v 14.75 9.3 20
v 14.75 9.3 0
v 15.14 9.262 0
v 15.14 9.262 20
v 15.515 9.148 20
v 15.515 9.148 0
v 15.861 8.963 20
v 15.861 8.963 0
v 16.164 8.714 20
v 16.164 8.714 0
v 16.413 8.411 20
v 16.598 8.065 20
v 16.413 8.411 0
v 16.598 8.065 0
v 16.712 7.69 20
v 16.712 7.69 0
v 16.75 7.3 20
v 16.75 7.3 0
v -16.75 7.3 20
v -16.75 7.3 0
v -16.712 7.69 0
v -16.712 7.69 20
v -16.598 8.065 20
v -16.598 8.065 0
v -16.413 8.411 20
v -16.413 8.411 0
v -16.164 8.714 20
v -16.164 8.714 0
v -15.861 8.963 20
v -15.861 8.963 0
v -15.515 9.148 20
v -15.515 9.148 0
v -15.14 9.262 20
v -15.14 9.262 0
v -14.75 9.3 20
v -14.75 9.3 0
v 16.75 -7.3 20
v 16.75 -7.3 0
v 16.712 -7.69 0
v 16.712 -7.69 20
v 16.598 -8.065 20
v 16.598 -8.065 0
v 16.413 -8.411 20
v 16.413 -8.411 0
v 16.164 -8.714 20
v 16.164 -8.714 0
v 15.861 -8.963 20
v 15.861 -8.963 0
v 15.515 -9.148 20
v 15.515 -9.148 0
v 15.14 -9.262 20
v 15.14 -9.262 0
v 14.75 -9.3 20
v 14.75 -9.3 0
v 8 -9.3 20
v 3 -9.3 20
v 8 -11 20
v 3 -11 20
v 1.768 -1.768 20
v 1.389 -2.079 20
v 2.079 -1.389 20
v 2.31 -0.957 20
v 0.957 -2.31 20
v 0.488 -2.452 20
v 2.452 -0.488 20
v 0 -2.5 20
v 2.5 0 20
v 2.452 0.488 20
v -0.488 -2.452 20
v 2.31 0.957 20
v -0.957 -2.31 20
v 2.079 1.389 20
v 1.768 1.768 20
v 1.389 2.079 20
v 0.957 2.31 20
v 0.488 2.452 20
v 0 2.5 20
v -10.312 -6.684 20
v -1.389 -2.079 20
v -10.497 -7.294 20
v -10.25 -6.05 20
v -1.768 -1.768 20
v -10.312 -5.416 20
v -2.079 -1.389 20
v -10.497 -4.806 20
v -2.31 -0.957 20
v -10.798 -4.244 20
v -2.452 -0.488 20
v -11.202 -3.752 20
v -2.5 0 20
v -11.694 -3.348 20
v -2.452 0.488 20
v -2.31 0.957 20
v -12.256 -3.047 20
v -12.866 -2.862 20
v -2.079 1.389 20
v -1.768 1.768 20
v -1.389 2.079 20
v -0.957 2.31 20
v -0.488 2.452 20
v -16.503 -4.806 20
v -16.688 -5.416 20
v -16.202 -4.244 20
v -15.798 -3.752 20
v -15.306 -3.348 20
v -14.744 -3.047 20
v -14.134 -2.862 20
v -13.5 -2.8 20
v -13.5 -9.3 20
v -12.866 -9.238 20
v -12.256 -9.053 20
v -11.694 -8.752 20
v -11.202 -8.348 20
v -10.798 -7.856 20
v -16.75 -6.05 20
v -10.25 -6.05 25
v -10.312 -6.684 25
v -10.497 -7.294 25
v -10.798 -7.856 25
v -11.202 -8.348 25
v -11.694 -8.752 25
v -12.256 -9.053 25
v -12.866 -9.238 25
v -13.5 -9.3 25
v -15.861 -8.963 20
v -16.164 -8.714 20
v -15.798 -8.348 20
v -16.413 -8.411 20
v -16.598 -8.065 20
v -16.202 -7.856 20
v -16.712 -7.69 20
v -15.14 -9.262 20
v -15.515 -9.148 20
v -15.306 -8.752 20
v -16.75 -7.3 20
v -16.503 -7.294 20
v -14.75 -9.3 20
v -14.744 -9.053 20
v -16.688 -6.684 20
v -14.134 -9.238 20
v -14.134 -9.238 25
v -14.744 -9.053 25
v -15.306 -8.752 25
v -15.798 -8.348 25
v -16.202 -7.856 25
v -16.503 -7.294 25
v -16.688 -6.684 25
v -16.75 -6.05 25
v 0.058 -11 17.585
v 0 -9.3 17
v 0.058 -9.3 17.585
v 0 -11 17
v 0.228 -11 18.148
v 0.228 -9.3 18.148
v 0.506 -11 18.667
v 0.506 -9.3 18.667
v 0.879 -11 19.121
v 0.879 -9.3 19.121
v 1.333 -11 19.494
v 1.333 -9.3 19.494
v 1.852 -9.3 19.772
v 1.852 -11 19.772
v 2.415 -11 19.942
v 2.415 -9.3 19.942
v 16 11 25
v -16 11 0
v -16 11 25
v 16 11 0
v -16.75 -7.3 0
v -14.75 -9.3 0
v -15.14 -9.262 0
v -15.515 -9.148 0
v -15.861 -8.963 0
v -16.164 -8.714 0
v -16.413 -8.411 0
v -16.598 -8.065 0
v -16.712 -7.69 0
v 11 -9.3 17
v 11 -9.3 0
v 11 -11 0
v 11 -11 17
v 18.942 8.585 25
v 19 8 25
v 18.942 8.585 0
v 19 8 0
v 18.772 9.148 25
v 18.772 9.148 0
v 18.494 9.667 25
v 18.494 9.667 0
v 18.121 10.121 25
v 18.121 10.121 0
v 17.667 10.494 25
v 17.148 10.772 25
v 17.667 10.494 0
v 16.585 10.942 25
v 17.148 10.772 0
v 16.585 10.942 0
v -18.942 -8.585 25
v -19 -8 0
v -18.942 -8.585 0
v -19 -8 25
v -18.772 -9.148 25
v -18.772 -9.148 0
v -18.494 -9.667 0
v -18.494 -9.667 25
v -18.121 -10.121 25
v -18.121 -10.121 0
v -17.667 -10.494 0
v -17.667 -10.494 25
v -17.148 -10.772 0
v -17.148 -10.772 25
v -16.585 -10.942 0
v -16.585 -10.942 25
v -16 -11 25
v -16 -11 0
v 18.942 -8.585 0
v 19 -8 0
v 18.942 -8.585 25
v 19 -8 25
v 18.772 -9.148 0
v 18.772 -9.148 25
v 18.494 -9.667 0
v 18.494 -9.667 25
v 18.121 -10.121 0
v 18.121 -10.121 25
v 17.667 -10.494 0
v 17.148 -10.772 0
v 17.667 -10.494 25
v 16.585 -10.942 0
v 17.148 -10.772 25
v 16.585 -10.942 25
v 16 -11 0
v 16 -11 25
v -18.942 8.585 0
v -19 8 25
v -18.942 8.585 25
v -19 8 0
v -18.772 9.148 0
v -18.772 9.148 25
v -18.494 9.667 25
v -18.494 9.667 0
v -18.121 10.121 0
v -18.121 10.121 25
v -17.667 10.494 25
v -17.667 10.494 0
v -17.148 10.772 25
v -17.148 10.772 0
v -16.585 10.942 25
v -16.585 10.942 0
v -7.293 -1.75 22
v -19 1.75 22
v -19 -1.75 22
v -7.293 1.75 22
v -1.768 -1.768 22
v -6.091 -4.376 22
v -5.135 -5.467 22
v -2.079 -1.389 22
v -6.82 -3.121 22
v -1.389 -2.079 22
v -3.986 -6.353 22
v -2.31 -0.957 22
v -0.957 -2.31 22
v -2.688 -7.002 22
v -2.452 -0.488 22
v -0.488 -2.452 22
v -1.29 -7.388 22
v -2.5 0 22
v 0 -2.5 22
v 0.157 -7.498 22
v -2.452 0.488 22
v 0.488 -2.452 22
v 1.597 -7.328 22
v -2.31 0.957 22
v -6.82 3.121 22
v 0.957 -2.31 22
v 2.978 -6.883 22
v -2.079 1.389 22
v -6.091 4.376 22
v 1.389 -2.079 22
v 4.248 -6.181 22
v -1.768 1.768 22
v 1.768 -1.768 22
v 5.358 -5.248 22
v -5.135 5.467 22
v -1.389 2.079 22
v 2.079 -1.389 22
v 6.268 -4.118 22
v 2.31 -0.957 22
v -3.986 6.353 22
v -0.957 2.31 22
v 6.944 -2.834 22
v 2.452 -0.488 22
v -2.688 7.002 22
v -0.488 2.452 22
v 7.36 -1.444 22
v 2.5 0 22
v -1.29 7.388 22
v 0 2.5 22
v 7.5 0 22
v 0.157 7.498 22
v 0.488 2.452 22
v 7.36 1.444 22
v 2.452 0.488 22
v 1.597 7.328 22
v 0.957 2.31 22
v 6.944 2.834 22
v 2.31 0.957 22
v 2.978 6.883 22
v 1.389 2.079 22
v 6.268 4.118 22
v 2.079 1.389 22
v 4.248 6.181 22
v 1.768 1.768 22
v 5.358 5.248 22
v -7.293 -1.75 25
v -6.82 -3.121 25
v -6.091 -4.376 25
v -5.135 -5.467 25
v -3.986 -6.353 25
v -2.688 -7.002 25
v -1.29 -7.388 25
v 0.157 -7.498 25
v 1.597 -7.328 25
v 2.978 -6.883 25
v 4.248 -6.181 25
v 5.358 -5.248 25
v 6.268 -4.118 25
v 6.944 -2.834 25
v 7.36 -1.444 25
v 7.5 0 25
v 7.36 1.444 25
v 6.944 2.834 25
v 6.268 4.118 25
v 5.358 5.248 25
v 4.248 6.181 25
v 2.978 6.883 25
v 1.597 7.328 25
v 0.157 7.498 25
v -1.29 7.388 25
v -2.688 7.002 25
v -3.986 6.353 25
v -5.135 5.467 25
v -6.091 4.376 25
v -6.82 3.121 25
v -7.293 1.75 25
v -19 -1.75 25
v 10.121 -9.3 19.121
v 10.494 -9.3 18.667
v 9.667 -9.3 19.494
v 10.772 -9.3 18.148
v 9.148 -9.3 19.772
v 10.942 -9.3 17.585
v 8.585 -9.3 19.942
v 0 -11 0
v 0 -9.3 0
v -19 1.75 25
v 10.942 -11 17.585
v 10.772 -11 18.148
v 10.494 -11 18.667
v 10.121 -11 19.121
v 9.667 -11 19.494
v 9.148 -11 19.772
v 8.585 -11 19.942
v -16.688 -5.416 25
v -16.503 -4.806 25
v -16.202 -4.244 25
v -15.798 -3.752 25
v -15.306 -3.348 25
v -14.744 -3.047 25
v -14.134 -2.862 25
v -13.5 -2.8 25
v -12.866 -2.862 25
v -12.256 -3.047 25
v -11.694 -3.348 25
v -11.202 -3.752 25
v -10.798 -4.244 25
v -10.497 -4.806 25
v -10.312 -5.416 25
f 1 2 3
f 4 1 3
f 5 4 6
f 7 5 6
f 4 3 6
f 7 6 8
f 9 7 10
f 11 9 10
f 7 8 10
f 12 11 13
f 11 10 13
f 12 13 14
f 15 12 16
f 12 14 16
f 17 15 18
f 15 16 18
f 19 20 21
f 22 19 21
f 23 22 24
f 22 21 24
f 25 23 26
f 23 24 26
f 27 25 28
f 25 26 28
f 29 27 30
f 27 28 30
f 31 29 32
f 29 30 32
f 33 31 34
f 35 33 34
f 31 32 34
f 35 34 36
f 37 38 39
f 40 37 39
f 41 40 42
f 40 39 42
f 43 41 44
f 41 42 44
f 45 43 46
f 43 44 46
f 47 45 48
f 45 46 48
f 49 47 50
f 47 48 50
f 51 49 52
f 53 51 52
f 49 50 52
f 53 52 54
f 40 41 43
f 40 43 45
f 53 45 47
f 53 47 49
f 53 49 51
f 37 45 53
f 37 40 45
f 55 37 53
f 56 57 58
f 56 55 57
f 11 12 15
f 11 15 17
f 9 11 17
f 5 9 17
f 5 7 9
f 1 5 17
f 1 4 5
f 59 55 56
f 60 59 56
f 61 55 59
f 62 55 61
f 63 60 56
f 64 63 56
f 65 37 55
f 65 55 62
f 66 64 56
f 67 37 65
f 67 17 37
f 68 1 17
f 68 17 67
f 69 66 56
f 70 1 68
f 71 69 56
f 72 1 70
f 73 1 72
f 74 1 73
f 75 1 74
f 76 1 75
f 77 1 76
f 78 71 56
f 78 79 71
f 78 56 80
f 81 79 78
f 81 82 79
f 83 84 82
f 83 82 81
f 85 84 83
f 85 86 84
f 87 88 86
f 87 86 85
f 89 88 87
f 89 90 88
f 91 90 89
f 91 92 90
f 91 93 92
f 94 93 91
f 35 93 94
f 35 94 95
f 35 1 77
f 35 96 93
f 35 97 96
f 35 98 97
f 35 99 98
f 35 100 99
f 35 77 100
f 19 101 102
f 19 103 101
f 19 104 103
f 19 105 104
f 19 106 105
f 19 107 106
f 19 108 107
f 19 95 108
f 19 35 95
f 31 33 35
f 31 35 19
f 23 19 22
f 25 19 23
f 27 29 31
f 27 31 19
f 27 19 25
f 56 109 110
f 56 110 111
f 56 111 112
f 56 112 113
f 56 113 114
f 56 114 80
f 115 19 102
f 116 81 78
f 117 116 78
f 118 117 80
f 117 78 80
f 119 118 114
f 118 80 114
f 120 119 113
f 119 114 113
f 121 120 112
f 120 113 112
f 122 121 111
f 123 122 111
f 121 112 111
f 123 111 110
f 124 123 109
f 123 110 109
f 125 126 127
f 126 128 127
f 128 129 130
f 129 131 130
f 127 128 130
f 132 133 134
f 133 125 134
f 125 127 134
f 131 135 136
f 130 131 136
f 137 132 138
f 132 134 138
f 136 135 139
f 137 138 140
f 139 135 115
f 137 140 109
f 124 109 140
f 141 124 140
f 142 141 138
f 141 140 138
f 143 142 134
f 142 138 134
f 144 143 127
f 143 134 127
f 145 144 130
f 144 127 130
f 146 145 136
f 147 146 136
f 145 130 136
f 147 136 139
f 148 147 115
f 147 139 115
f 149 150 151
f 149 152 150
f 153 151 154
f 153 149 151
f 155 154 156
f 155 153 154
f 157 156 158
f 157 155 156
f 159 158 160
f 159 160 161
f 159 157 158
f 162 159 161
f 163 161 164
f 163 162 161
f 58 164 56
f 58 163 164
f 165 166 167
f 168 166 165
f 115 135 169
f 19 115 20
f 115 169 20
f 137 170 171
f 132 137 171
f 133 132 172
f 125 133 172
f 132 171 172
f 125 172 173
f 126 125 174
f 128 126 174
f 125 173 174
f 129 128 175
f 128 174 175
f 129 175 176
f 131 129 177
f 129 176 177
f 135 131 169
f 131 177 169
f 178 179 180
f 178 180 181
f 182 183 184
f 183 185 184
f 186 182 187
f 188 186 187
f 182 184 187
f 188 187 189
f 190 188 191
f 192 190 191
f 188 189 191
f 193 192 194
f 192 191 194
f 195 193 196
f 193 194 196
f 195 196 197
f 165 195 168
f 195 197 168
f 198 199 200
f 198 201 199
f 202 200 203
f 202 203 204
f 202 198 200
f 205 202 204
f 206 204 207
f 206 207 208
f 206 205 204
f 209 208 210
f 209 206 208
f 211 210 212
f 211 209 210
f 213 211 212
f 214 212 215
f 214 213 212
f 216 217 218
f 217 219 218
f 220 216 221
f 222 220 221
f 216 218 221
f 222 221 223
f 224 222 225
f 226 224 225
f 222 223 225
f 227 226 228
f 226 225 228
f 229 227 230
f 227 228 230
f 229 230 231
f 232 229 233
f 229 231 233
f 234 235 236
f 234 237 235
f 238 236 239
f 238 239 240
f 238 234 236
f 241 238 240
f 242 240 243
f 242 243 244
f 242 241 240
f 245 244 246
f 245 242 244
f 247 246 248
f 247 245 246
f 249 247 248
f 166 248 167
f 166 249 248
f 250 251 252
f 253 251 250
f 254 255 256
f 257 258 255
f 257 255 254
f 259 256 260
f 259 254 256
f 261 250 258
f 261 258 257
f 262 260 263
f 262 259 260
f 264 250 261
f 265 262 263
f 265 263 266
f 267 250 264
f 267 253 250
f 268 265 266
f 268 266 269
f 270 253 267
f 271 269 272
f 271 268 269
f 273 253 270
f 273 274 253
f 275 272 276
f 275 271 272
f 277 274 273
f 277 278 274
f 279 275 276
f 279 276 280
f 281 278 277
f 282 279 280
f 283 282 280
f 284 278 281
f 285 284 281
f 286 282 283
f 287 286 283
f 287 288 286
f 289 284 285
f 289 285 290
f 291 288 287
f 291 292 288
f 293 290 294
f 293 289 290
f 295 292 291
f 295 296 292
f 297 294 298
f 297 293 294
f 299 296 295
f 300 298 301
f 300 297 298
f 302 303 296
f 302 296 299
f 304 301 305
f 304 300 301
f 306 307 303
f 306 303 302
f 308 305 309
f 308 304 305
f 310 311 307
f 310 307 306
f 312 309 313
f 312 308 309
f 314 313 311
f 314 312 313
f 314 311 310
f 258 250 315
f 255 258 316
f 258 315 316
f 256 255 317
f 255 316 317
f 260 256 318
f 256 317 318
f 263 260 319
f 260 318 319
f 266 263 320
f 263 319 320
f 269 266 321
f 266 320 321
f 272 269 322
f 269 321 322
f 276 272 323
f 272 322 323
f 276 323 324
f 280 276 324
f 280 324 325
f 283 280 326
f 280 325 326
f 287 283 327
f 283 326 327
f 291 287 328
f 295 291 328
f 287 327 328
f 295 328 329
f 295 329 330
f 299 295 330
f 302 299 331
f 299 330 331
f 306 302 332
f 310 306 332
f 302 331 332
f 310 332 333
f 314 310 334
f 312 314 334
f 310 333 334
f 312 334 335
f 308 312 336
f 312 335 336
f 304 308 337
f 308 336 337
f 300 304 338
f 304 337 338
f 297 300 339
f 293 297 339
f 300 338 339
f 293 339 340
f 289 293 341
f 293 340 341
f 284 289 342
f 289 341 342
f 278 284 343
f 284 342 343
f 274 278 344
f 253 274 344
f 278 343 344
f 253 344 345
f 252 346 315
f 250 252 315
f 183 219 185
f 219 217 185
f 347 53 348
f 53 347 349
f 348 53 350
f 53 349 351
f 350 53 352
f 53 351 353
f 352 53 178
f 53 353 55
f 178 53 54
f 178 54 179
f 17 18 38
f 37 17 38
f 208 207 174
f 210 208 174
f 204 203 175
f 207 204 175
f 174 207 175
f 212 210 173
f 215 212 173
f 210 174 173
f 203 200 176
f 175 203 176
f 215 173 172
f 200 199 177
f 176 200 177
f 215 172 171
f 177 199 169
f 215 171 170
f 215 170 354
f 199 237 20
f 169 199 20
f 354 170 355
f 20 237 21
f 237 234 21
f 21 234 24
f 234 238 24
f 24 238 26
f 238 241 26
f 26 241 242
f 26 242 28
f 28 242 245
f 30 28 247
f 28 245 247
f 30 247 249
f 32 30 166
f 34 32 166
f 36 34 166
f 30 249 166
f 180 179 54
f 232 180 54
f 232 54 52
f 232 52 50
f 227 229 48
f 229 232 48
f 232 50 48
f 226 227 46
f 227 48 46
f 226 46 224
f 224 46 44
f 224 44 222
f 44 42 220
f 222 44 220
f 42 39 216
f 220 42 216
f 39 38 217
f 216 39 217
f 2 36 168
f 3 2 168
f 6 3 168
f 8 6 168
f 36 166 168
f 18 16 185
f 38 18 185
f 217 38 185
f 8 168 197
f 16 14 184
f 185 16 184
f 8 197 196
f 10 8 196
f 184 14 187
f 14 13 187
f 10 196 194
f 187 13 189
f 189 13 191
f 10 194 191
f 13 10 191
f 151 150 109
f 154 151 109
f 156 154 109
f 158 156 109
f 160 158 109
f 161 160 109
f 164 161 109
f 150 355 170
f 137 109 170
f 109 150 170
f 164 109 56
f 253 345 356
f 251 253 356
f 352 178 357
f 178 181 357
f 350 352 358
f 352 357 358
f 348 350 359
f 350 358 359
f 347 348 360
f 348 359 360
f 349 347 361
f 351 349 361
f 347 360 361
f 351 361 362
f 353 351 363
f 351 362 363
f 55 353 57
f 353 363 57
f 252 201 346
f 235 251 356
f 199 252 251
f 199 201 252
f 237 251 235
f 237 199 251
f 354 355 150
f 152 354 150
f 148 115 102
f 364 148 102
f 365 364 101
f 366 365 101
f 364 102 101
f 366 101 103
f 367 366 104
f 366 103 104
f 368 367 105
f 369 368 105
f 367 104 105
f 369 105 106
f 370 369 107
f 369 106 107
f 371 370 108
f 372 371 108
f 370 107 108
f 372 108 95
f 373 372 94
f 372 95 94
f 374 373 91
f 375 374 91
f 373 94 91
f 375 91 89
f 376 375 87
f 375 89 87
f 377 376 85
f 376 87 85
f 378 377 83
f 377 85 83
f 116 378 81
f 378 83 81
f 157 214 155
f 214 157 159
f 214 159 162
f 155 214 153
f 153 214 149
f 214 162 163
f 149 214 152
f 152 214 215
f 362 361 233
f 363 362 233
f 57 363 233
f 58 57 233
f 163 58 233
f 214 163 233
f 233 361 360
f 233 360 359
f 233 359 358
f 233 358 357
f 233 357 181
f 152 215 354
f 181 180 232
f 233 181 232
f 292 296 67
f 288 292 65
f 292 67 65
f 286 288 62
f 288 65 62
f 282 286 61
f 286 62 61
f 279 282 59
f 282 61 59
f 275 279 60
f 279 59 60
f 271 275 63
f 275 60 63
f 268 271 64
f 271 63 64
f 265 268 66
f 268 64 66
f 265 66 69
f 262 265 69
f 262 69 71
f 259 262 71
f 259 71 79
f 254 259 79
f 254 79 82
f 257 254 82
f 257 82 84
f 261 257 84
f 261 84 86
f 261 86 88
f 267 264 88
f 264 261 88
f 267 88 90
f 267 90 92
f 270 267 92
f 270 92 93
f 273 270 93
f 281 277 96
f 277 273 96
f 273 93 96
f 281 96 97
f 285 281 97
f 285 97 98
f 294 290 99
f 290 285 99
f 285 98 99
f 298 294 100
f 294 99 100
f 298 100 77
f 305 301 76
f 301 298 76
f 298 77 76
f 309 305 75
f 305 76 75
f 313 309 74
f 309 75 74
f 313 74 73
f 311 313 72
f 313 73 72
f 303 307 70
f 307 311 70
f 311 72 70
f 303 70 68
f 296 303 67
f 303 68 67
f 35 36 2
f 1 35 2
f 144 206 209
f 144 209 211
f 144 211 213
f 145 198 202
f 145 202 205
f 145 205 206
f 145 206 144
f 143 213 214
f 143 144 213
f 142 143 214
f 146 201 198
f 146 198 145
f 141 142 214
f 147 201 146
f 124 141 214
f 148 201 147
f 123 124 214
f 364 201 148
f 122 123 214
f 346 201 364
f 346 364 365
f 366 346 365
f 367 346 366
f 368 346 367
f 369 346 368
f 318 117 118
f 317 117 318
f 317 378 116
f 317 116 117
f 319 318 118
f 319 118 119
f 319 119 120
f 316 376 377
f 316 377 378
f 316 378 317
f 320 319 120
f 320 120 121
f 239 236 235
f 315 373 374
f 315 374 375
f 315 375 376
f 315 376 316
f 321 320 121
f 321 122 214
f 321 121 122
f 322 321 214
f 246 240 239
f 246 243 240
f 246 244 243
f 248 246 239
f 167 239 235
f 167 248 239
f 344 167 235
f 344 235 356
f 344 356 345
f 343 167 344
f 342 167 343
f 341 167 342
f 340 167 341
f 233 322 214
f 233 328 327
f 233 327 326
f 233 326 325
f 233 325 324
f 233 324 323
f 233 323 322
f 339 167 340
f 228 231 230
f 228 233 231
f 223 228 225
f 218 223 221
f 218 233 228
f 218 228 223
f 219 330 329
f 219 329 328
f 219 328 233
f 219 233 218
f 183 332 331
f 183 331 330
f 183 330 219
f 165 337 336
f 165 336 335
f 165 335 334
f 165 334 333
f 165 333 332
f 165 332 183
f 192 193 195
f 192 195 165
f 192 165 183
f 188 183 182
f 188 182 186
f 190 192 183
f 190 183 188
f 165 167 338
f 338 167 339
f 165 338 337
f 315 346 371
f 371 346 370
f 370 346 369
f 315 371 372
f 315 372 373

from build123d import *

# Parameters (mm, degrees)
F0_W      = 38
F0_H      = 22
F1_DEPTH  = 20
F2_W      = 38
F2_H      = 22
F3_DEPTH  = 5
F4_R      = 2.5
F5_DEPTH  = 5
F6_R      = 7.5
F6_R_2    = 2.5
F7_DEPTH  = 3
F8_W      = 11
F8_H      = 20
F9_DEPTH  = 1.7
F11_DEPTH = 3
F12_R     = 3
F13_R     = 3


with BuildPart() as f1:
    # F0 (on Top) → F1 (new body)
    with BuildSketch(Plane.XY):
        Rectangle(F0_W, F0_H)
        with BuildLine():
            ThreePointArc((-16.75, 7.3), (-16.1642135624, 8.7142135624), (-14.75, 9.3))
            Line((-14.75, 9.3), (14.75, 9.3))
            ThreePointArc((14.75, 9.3), (16.1642135624, 8.7142135624), (16.75, 7.3))
            Line((16.75, 7.3), (16.75, -7.3))
            ThreePointArc((16.75, -7.3), (16.1642135624, -8.7142135624), (14.75, -9.3))
            Line((14.75, -9.3), (-14.75, -9.3))
            ThreePointArc((-14.75, -9.3), (-16.1642135624, -8.7142135624), (-16.75, -7.3))
            Line((-16.75, -7.3), (-16.75, 7.3))
        make_face(mode=Mode.SUBTRACT)
    extrude(amount=F1_DEPTH)

    # F2 (on face) → F3 (join)
    with BuildSketch(Plane.XY.offset(20)):
        Rectangle(F2_W, F2_H)
    extrude(amount=F3_DEPTH)

    # F4 (on face) → F5 (cut, through all)
    with BuildSketch(Plane(origin=(0, 0, 20), x_dir=(1, 0, 0), z_dir=(0, 0, -1))):
        with BuildLine():
            ThreePointArc((-16.75, 6.05), (-13.5, 2.8), (-10.25, 6.05))
            ThreePointArc((-10.25, 6.05), (-11.2019029611, 8.3480970389), (-13.5, 9.3))
            ThreePointArc((-13.5, 9.3), (-15.7980970389, 8.3480970389), (-16.75, 6.05))
        make_face()
        Circle(F4_R)
    extrude(amount=-F5_DEPTH, mode=Mode.SUBTRACT)

    # F6 (on face) → F7 (cut)
    with BuildSketch(Plane.XY.offset(25)):
        Circle(F6_R)
        Circle(F6_R_2, mode=Mode.SUBTRACT)
    extrude(amount=-F7_DEPTH, mode=Mode.SUBTRACT)

    # F8 (on face) → F9 (cut, through all)
    with BuildSketch(Plane(origin=(0, -9.3, 0), x_dir=(-1, 0, 0), z_dir=(0, 1, 0))):
        with Locations((-5.5, 10)):
            Rectangle(F8_W, F8_H)
    extrude(amount=-F9_DEPTH, mode=Mode.SUBTRACT)

    # F10 (on face) → F11 (cut, through all)
    with BuildSketch(Plane.XY.offset(25)):
        with BuildLine():
            Line((-7.2929760729, 1.75), (-19, 1.75))
            Line((-19, 1.75), (-19, -1.75))
            Line((-19, -1.75), (-7.2929760729, -1.75))
            ThreePointArc((-7.2929760729, -1.75), (-7.5, 0), (-7.2929760729, 1.75))
        make_face()
    extrude(amount=-F11_DEPTH, mode=Mode.SUBTRACT)

    # F12
    f12_edges = [f1.edges().sort_by_distance(p)[0] for p in [
        (-19, -11, 12.5),
        (19, -11, 12.5),
        (19, 11, 12.5),
        (-19, 11, 12.5),
    ]]
    fillet(f12_edges, radius=F12_R)

    # F13
    f13_edges = [f1.edges().sort_by_distance(p)[0] for p in [
        (0, -10.15, 20),
        (11, -10.15, 20),
    ]]
    fillet(f13_edges, radius=F13_R)


solid = f1.part
